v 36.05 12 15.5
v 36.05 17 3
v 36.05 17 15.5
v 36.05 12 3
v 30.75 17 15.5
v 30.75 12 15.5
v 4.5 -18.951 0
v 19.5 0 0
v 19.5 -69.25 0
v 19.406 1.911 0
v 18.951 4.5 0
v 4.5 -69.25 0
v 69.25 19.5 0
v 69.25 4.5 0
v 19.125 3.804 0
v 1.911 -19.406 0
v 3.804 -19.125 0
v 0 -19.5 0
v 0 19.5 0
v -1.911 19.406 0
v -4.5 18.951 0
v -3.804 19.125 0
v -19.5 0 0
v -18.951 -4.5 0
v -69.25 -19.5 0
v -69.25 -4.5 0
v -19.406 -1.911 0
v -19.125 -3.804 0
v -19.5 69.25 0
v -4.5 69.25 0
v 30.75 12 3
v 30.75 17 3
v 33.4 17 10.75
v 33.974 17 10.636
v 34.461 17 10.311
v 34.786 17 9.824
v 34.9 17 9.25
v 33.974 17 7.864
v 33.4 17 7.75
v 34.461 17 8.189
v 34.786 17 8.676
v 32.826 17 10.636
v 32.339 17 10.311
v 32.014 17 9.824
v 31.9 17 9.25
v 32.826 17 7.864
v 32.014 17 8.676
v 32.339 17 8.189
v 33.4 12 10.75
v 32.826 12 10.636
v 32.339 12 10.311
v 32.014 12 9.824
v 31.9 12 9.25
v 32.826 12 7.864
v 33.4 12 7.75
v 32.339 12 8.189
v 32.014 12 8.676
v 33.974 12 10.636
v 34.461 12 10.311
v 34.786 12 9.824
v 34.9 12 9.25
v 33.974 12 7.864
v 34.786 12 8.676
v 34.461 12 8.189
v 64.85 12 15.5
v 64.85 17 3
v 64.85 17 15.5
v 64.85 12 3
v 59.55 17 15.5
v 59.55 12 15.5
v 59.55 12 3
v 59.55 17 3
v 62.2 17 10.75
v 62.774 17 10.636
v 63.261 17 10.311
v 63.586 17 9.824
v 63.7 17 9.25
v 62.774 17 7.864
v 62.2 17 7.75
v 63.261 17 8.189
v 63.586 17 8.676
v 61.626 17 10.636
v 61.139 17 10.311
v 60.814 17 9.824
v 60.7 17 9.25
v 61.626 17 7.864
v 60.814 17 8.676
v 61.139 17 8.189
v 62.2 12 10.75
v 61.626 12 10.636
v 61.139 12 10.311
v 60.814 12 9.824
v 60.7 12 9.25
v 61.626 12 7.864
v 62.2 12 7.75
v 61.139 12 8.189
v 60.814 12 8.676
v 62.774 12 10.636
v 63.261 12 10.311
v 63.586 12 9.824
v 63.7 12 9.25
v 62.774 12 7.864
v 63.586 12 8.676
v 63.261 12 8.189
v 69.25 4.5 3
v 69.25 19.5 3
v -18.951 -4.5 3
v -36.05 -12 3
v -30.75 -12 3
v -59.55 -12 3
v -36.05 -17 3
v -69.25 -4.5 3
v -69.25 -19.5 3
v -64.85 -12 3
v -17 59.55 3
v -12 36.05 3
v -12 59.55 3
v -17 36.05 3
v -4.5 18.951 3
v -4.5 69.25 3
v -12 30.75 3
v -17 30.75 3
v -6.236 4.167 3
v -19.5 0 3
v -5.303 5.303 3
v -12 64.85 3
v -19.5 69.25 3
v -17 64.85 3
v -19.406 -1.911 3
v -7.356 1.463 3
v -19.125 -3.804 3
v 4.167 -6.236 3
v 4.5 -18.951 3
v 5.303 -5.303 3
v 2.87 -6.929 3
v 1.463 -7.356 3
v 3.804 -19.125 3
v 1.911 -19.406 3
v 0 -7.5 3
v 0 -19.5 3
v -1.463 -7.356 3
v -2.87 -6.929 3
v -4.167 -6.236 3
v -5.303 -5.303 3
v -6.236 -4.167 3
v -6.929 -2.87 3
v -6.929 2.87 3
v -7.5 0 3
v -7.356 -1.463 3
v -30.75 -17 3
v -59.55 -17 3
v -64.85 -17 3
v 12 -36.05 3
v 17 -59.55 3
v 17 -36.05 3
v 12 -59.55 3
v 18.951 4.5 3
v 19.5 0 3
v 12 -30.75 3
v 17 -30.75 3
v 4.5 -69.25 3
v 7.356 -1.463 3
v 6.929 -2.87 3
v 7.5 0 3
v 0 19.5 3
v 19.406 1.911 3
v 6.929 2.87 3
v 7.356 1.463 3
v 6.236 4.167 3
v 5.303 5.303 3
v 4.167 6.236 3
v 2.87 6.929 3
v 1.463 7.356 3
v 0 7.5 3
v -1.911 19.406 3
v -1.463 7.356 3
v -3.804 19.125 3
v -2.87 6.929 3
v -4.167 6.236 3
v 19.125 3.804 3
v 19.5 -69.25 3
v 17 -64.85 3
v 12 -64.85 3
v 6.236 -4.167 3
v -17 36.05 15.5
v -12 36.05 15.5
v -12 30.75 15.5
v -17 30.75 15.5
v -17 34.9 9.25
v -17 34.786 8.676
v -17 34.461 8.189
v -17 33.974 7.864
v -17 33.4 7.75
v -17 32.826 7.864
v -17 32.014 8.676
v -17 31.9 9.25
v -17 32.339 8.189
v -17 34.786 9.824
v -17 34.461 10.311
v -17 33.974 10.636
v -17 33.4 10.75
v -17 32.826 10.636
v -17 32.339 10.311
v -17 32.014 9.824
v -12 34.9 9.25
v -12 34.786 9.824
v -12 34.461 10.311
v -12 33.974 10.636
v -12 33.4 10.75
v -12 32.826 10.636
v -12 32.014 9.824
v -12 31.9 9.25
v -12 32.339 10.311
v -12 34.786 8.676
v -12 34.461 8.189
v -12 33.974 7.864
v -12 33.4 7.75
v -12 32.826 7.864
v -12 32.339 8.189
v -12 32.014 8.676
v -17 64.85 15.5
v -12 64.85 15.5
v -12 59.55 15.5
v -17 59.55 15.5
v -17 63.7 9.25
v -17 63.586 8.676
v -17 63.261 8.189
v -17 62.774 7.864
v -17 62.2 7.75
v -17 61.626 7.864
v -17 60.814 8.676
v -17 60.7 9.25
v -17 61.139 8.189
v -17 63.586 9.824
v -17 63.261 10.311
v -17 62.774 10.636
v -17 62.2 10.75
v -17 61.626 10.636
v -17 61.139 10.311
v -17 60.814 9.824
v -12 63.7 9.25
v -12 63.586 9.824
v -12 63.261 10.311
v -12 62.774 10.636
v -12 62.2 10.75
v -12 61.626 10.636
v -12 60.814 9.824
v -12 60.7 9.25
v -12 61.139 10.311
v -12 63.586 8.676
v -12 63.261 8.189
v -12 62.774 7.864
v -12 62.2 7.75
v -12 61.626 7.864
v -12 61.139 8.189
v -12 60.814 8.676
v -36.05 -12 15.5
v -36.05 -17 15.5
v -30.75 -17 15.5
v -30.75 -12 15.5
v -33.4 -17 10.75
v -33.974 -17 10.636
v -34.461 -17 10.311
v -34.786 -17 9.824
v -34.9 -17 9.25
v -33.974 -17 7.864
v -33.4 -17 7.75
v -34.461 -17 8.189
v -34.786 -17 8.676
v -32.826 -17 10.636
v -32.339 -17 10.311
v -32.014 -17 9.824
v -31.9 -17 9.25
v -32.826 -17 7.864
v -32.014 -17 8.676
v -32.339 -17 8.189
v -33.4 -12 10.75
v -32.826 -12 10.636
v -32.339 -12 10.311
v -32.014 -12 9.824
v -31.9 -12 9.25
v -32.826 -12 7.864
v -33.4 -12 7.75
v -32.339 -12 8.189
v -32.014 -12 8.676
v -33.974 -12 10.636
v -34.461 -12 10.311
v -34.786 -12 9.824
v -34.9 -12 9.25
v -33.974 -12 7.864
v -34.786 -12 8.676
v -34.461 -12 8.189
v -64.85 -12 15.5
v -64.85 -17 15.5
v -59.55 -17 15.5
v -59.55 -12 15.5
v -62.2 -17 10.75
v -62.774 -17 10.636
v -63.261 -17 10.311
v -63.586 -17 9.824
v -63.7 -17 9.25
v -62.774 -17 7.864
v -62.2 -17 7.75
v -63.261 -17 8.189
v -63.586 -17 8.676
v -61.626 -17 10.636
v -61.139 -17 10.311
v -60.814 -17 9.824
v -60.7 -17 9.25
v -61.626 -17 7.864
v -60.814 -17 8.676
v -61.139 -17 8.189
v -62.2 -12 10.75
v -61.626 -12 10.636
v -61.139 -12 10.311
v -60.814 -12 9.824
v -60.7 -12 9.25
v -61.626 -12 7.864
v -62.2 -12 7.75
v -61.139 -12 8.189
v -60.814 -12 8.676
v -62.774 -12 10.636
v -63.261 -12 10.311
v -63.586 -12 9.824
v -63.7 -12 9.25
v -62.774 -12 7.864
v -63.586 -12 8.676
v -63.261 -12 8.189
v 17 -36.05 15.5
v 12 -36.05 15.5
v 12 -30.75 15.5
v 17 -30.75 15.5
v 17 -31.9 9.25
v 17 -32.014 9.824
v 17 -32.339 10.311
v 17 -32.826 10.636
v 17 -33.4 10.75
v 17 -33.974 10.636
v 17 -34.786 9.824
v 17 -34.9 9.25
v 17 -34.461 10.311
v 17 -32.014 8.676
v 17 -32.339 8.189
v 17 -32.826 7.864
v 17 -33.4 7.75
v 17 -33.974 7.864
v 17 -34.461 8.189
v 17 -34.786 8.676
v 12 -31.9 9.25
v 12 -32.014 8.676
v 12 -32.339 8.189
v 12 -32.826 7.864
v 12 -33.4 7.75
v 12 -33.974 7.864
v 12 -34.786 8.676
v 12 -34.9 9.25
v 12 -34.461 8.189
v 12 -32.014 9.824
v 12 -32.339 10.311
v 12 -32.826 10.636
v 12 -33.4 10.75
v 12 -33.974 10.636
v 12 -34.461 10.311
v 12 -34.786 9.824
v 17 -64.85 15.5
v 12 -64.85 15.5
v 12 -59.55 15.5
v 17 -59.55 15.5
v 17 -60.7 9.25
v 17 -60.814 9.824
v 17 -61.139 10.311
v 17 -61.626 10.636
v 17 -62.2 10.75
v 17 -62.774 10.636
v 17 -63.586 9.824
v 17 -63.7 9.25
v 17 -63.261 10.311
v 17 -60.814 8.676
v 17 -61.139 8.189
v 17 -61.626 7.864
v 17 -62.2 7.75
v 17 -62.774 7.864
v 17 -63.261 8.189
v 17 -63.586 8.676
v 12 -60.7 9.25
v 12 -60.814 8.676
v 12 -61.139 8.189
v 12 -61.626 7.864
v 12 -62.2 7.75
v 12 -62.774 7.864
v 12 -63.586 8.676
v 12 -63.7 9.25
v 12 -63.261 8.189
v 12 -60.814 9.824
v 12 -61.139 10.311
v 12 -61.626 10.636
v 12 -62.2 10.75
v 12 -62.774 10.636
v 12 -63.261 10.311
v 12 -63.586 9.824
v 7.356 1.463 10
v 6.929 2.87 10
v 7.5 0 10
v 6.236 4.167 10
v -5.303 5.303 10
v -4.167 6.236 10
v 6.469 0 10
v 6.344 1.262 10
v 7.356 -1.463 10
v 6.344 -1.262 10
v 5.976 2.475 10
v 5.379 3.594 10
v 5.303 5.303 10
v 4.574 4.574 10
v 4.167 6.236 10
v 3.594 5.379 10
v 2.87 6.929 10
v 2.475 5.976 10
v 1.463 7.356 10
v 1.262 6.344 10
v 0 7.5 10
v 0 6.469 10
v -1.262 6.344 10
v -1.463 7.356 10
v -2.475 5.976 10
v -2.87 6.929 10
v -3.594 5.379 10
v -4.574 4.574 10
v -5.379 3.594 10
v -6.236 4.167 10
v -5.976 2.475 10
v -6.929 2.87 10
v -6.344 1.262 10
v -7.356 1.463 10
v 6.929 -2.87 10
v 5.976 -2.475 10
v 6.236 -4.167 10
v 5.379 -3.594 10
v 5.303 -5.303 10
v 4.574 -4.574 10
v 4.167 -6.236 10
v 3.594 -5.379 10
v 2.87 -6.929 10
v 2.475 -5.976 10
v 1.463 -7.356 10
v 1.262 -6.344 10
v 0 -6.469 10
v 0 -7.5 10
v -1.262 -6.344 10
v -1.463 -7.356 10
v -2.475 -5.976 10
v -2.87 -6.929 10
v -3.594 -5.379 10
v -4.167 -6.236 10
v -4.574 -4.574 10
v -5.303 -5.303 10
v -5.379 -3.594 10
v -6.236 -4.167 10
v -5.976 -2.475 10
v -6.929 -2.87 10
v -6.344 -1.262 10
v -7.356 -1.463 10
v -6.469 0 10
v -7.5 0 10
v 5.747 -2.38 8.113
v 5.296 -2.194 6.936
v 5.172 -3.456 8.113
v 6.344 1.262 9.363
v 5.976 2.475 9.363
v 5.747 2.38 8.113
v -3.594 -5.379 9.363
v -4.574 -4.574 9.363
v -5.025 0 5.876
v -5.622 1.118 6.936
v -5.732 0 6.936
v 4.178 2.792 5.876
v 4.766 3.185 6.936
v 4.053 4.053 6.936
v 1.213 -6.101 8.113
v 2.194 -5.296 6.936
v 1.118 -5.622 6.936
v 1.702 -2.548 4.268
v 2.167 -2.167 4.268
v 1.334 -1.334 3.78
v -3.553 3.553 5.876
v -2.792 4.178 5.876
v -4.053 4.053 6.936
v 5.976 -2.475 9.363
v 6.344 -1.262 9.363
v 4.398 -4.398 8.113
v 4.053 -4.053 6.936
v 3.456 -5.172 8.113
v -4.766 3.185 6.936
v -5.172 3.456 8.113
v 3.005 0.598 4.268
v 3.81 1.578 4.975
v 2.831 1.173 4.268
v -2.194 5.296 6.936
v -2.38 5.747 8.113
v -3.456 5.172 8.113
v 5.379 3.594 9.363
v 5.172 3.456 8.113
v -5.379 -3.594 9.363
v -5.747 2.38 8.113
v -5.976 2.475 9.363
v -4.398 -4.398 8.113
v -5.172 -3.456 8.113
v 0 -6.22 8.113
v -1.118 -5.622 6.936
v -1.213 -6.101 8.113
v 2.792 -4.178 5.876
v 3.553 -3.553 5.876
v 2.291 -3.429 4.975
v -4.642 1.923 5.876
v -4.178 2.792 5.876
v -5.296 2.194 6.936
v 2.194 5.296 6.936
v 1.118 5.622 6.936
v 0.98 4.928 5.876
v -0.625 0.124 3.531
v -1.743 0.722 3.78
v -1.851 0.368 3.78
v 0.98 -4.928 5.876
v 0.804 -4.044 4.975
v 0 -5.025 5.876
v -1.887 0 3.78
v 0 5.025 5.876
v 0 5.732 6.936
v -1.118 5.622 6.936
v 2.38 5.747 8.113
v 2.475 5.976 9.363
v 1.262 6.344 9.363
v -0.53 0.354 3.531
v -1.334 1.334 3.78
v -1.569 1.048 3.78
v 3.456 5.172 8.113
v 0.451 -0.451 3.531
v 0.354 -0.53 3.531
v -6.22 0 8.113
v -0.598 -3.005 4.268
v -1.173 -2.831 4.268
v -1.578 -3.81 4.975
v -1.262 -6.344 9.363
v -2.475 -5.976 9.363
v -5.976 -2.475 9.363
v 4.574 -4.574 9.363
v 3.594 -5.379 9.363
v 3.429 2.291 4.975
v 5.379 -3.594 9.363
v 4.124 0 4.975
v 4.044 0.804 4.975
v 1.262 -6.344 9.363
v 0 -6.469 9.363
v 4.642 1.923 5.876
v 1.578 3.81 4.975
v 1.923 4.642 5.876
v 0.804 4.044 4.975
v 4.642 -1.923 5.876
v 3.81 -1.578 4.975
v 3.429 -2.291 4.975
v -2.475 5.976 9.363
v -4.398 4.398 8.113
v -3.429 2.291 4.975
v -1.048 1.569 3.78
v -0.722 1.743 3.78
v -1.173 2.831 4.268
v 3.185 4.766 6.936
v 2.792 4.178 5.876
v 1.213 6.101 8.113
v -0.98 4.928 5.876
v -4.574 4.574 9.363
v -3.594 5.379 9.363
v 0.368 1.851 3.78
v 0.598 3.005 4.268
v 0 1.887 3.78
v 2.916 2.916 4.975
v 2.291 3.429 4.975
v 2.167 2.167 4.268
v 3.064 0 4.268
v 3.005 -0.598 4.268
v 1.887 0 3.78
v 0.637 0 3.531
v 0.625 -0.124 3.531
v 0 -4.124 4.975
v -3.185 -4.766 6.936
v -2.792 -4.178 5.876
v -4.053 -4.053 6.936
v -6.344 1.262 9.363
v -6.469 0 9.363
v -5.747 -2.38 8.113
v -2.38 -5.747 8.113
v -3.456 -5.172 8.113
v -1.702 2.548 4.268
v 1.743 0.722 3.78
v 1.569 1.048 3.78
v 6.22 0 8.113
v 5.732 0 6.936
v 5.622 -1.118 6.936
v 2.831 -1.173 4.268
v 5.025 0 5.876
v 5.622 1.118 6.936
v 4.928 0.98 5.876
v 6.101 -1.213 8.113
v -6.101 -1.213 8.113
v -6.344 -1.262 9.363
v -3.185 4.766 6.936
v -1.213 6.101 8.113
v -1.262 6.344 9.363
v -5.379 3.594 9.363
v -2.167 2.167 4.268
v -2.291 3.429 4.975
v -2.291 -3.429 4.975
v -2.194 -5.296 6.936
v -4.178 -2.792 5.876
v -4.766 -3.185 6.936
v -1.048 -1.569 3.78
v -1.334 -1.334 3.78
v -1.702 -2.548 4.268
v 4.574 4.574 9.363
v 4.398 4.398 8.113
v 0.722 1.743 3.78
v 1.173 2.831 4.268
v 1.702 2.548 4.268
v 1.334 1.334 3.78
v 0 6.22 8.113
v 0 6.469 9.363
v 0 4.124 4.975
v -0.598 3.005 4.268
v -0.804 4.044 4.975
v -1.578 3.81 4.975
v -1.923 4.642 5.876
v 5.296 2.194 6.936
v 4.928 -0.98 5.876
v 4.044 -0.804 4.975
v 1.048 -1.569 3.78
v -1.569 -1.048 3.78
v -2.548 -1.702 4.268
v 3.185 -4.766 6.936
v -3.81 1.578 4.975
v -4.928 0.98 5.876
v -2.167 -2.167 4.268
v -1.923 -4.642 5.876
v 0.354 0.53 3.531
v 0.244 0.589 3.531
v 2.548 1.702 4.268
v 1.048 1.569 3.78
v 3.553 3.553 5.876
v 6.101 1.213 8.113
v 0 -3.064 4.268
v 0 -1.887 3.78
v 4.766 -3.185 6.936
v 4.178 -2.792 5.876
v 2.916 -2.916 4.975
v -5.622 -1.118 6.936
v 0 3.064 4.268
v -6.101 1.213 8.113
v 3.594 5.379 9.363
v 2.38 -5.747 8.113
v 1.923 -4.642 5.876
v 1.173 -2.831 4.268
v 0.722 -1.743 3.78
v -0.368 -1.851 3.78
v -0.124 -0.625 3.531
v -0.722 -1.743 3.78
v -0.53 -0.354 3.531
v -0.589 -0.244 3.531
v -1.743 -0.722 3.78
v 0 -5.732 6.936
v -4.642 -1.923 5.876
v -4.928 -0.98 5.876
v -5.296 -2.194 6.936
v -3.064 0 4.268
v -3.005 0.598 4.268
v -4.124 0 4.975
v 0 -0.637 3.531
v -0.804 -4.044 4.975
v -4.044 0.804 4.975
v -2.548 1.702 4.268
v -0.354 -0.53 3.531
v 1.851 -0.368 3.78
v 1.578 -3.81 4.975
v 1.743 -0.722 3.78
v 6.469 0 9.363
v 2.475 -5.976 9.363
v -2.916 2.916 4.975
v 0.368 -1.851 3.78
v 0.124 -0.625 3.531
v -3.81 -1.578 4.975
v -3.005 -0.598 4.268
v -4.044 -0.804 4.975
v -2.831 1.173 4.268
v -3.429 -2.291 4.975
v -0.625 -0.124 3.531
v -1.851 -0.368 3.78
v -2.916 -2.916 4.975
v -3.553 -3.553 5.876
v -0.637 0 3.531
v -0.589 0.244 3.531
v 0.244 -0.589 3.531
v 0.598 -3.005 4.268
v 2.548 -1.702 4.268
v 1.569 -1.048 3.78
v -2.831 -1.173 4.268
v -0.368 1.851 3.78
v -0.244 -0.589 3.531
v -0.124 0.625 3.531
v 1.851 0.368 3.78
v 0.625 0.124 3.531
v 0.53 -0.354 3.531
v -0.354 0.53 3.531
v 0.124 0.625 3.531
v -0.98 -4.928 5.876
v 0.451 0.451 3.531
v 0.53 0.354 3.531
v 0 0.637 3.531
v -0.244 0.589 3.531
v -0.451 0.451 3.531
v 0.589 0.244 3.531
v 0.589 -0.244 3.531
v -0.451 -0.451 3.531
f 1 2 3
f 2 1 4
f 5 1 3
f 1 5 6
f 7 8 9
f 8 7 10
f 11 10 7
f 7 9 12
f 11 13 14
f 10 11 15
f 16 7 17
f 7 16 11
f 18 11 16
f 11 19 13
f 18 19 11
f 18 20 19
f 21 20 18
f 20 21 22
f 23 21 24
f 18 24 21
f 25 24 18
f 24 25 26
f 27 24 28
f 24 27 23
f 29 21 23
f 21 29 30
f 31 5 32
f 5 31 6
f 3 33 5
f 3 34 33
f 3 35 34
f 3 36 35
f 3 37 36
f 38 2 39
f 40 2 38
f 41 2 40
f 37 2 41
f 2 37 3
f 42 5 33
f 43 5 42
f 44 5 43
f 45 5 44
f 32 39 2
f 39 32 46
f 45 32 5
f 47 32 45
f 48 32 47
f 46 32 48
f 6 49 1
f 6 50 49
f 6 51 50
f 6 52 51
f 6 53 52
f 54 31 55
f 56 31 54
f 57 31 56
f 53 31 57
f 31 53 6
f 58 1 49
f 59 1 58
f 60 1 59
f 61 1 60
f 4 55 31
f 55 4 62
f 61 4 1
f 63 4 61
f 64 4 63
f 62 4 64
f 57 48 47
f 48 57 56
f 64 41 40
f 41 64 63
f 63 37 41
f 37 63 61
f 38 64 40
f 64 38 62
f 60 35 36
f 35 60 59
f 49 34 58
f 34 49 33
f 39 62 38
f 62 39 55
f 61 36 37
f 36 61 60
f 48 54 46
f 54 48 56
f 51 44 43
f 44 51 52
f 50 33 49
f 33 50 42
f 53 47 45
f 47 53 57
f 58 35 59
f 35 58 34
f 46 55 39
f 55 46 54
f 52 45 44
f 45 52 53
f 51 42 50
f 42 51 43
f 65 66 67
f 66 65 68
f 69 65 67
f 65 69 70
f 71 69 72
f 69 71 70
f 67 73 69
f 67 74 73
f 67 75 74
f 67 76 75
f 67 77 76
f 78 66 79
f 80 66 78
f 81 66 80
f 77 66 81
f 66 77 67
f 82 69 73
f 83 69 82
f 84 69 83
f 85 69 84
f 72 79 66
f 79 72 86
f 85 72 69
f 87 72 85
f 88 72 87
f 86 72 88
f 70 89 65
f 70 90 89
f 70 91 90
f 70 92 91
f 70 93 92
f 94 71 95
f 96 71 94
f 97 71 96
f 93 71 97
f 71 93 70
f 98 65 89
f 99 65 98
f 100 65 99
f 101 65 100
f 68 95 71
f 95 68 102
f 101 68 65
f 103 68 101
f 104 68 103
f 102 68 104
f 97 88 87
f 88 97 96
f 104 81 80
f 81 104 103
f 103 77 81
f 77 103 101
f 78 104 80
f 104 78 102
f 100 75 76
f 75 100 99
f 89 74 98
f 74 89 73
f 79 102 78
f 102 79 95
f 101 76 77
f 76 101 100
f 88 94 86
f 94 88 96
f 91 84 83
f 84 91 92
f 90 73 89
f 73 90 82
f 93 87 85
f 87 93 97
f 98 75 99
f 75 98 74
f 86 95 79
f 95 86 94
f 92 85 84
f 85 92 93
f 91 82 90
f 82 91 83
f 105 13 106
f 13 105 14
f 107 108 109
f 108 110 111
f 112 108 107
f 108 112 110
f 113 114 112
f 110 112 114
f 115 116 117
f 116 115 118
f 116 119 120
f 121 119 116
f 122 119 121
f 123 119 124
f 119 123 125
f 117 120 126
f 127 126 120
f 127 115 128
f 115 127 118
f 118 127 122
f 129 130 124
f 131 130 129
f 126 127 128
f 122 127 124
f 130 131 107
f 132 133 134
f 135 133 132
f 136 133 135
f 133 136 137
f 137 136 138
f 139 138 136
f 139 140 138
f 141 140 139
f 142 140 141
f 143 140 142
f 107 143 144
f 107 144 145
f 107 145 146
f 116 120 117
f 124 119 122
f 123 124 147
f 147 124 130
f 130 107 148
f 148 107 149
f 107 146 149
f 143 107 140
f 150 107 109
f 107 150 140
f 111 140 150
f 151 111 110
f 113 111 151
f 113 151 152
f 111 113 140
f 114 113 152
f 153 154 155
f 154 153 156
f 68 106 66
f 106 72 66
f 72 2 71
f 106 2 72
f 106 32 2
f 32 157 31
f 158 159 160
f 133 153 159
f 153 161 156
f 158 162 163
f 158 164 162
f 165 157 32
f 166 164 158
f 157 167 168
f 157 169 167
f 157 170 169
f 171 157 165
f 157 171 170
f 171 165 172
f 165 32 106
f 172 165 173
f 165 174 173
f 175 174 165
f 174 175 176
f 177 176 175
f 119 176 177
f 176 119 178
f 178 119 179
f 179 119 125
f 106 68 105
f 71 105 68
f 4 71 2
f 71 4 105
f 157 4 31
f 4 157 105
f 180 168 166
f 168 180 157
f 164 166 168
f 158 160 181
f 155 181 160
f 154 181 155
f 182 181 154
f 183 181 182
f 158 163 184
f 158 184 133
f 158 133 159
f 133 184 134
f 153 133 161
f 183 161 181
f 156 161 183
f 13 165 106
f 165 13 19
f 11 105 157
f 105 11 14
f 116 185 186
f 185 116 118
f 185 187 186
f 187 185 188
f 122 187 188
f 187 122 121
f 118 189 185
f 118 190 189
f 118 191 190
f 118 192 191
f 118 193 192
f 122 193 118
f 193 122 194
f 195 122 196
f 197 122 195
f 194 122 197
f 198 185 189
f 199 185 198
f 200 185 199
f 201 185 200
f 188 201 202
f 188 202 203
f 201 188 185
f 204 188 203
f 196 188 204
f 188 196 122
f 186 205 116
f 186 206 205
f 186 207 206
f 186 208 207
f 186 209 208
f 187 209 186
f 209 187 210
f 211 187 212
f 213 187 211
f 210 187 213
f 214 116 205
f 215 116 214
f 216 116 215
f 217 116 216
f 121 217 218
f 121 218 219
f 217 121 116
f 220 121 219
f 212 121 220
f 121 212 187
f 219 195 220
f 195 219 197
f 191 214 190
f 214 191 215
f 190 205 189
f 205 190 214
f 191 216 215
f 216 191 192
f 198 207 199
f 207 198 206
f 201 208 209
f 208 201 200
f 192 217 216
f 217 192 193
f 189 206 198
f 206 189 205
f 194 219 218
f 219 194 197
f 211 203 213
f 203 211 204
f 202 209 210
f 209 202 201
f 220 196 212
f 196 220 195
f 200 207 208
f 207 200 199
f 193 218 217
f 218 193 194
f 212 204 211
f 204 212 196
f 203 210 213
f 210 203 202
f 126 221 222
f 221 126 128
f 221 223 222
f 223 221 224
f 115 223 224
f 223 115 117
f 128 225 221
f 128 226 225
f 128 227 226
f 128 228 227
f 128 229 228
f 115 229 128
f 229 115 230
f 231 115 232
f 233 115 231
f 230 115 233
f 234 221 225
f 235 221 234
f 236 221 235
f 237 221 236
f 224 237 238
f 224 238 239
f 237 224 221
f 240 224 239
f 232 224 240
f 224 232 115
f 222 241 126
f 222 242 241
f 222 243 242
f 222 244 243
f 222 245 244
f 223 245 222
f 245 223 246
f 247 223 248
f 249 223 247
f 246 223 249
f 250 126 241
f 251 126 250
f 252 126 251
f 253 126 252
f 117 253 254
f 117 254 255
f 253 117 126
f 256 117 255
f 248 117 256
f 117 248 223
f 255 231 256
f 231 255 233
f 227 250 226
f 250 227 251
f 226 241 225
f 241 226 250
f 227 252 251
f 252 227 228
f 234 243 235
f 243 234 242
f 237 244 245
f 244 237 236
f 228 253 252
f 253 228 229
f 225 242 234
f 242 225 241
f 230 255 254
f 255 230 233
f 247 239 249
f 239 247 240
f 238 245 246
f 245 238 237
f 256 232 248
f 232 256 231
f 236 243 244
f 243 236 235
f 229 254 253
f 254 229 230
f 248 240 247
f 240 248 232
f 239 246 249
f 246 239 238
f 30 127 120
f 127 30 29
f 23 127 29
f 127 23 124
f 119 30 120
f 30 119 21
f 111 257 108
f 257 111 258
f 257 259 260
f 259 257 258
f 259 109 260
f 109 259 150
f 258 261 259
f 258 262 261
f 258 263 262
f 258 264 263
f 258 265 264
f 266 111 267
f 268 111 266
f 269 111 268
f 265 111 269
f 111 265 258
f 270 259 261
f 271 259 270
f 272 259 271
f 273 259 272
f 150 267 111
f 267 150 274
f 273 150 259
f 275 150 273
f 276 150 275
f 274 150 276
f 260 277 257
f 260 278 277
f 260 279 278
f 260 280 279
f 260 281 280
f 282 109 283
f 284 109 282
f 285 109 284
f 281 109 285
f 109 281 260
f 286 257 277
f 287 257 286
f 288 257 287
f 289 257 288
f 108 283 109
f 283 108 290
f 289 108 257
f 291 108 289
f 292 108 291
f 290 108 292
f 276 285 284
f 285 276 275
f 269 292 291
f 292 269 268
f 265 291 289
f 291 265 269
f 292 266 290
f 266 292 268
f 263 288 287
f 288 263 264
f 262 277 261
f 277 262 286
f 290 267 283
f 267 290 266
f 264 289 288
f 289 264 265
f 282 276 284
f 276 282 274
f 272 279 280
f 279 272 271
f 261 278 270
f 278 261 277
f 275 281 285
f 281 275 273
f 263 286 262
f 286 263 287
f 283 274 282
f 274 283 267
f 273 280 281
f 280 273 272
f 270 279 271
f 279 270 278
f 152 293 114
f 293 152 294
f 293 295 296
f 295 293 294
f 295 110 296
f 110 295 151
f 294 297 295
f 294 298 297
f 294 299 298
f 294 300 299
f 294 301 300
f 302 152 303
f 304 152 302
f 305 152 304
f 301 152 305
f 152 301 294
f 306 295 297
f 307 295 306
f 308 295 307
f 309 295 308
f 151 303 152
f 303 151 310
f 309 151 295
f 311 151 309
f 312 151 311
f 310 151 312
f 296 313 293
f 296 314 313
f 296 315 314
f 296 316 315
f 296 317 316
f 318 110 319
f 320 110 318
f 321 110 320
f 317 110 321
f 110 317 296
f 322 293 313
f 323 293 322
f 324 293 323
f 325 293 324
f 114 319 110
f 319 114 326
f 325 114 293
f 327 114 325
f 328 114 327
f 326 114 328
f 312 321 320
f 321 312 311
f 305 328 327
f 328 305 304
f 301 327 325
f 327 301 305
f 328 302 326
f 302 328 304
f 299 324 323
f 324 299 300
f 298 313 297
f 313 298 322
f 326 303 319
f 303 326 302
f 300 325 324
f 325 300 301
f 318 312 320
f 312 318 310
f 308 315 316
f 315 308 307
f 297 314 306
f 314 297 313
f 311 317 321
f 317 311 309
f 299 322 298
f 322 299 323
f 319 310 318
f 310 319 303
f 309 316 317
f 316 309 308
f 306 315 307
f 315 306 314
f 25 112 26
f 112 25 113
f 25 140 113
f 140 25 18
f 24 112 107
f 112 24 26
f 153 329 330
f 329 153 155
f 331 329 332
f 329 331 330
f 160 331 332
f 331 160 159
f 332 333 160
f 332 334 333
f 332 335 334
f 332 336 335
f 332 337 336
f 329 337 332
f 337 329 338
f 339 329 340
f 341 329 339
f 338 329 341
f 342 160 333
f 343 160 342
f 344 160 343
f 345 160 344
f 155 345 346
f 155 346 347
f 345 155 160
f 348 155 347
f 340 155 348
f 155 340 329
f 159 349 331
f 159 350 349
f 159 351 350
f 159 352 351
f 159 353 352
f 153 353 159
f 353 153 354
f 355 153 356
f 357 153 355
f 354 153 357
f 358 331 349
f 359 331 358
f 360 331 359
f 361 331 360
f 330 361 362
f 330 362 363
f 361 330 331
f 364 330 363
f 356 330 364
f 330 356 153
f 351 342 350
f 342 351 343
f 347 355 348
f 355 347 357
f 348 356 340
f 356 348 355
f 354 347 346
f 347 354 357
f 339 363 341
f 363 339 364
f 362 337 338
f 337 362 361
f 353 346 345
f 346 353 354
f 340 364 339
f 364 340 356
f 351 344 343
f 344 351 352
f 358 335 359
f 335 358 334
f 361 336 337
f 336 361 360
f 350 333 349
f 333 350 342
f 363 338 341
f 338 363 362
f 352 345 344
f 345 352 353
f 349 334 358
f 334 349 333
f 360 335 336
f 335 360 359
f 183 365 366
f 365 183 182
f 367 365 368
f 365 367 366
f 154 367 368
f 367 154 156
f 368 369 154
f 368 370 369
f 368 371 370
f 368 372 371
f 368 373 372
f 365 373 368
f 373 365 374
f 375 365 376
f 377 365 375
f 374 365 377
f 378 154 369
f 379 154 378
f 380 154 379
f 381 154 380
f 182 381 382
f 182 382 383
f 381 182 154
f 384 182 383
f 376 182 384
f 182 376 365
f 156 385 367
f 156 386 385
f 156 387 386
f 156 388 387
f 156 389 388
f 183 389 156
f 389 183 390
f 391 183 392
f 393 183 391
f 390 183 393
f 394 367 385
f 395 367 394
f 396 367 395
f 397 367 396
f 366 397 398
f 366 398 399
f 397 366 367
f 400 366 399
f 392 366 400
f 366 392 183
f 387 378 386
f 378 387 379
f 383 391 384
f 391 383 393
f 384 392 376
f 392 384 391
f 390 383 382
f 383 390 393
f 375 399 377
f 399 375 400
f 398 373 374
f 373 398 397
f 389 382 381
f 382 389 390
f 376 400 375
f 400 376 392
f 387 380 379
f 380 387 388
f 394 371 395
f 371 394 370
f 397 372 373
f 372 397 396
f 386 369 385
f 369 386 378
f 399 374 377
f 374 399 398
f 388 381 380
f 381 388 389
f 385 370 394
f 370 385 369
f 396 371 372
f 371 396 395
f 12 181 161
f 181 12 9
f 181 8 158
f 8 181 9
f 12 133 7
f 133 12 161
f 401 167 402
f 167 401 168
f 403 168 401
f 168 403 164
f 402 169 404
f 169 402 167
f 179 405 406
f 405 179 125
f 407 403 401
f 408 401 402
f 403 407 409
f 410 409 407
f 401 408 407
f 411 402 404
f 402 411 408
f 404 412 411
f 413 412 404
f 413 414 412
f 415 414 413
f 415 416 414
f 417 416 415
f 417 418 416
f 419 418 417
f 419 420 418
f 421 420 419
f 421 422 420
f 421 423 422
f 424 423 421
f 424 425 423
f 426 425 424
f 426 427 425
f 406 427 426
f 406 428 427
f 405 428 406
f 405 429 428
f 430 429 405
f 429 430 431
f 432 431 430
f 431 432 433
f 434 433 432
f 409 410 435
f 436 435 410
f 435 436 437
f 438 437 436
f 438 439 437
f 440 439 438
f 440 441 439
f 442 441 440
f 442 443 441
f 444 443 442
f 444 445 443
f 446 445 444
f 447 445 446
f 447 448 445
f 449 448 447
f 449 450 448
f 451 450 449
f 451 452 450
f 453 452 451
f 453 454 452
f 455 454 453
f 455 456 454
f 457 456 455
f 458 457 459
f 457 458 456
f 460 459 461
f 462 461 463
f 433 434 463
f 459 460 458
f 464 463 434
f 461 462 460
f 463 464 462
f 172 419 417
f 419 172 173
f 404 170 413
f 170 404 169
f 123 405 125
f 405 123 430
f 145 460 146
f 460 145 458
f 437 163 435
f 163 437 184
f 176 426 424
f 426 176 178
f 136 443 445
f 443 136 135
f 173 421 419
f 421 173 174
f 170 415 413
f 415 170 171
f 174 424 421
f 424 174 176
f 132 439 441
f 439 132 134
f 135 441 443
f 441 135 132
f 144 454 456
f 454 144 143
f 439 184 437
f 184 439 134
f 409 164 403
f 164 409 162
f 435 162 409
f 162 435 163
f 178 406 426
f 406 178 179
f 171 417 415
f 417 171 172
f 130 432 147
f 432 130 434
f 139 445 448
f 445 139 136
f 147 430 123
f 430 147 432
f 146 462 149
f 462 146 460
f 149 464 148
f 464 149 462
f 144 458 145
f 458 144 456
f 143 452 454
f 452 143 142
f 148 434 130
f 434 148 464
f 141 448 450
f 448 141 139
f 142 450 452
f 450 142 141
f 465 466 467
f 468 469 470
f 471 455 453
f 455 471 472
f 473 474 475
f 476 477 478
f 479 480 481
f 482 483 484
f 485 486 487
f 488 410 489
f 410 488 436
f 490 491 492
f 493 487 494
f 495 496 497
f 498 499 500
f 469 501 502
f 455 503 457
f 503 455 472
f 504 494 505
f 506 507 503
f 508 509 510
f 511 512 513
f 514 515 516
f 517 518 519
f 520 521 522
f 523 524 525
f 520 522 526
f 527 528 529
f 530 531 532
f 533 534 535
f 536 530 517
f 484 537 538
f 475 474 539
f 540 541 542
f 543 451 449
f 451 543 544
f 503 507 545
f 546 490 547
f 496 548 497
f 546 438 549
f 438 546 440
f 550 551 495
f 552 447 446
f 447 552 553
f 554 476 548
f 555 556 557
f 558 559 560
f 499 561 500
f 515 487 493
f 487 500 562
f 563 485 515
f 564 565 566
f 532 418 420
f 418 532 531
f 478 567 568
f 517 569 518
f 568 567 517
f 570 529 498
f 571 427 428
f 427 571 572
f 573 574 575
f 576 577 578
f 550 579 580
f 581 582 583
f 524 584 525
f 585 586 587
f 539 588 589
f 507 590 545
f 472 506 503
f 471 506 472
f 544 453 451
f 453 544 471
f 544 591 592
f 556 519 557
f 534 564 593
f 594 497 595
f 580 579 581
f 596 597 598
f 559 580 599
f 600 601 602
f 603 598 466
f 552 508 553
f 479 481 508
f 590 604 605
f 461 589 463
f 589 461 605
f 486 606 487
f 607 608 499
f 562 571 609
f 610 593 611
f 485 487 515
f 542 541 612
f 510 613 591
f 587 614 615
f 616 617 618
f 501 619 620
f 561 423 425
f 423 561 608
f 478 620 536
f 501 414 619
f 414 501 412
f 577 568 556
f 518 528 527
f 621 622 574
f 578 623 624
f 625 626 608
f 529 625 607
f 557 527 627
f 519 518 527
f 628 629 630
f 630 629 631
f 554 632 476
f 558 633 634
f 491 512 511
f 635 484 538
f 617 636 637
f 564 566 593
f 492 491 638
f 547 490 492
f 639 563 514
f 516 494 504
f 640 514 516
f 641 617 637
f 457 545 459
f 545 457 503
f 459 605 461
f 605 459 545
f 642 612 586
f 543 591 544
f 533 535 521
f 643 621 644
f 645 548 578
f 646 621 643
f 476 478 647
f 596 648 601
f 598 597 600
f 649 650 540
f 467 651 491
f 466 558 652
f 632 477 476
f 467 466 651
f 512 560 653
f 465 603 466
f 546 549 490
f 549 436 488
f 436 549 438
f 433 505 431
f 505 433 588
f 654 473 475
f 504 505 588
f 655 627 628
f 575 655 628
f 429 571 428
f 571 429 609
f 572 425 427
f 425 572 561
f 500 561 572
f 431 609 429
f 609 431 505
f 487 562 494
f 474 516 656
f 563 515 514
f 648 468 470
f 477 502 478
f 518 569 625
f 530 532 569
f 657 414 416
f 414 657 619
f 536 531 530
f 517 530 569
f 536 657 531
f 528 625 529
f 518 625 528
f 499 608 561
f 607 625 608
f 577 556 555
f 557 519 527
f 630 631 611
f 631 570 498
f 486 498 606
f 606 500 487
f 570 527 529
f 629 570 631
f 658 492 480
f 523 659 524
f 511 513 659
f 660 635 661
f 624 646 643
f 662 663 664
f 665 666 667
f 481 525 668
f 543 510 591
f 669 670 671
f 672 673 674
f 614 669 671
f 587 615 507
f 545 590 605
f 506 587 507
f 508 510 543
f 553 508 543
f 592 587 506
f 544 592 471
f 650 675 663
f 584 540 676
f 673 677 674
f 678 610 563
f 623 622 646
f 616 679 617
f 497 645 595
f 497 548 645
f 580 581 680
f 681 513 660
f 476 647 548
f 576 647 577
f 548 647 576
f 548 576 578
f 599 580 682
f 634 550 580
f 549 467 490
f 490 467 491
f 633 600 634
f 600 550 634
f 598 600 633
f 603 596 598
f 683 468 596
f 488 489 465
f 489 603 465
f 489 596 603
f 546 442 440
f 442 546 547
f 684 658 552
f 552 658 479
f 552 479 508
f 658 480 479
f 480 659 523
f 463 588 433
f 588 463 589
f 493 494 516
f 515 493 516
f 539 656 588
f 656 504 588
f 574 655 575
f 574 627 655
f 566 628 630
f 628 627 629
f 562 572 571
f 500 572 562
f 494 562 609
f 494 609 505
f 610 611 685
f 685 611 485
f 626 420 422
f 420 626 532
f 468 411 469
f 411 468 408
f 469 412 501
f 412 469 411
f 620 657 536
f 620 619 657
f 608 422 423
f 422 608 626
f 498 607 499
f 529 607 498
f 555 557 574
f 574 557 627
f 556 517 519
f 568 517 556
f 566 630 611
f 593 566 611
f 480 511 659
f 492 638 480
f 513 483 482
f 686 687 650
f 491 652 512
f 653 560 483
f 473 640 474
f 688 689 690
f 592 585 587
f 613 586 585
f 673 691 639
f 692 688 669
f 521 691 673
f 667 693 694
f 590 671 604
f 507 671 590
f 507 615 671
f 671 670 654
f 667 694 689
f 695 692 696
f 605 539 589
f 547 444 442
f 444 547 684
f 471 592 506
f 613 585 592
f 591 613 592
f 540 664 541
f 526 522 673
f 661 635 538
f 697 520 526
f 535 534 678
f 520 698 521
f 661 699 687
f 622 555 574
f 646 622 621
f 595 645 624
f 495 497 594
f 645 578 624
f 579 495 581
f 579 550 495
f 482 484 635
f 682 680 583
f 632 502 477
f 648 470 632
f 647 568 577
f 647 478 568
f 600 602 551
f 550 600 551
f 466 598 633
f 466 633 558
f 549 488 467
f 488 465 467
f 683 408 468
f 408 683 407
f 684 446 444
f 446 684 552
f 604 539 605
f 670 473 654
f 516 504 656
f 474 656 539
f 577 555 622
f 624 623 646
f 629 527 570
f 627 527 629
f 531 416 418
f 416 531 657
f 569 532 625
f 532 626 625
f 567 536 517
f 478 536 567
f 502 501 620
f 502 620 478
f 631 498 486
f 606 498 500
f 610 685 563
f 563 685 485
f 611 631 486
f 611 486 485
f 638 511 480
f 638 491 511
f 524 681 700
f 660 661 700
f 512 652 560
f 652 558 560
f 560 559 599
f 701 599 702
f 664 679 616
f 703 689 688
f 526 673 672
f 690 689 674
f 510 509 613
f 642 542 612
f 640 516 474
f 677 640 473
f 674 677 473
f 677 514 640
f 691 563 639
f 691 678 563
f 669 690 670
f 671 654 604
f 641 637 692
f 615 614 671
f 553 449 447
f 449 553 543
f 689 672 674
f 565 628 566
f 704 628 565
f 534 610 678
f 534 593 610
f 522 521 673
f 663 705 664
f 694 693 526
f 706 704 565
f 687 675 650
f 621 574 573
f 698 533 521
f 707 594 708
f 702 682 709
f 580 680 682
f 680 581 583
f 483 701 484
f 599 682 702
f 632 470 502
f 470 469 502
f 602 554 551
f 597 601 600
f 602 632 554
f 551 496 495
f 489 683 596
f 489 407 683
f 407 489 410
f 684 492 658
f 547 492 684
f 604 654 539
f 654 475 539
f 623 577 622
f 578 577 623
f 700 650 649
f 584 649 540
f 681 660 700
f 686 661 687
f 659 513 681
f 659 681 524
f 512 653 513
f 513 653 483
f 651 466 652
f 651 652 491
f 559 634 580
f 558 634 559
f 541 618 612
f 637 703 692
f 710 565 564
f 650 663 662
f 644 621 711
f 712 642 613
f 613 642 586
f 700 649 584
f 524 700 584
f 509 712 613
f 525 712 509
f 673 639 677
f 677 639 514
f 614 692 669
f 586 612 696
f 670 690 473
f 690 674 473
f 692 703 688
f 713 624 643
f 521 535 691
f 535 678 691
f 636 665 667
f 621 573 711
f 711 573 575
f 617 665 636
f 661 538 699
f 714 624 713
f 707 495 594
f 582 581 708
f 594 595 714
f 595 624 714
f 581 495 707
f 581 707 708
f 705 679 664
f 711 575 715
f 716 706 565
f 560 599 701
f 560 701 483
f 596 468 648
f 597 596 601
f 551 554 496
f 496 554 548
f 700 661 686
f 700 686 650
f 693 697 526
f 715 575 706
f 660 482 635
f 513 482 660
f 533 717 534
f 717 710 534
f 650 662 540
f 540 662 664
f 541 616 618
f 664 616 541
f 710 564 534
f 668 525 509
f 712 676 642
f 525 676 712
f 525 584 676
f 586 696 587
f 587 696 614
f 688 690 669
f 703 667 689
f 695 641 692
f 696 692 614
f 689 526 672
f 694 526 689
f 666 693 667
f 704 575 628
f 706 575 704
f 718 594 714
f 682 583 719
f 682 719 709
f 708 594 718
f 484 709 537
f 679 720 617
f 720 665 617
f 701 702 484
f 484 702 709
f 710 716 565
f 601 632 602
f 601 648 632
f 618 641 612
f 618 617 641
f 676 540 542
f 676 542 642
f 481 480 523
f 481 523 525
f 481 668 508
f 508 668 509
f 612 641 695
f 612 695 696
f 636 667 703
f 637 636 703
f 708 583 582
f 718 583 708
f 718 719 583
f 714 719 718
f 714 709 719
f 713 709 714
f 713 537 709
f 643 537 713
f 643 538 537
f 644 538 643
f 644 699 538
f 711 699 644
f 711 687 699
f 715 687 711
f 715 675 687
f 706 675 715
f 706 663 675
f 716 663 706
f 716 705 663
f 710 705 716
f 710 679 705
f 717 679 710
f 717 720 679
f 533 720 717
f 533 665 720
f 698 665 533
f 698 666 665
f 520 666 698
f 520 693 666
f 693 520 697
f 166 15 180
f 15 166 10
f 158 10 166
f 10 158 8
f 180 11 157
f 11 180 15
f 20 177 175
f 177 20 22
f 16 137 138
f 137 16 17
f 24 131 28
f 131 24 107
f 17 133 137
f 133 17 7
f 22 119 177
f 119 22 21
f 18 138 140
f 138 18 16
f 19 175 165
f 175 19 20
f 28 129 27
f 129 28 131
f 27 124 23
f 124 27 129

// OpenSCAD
union() {
	union() {
		rotate(a = 0.0000000000, v = [0, 0, 1]) {
			union() {
				translate(v = [0, 4.5000000000, 0]) {
					cube(size = [69.2500000000, 15, 3]);
				}
				translate(v = [30.7500000000, 12, 0]) {
					union() {
						difference() {
							cube(size = [5.3000000000, 5, 15.5000000000]);
							translate(v = [2.6500000000, 0, 9.2500000000]) {
								rotate(a = -90, v = [1, 0, 0]) {
									translate(v = [0, 0, -0.5000000000]) {
										cylinder($fn = 16, h = 6, r = 1.5000000000);
									}
								}
							}
						}
						translate(v = [28.8000000000, 0, 0]) {
							difference() {
								cube(size = [5.3000000000, 5, 15.5000000000]);
								translate(v = [2.6500000000, 0, 9.2500000000]) {
									rotate(a = -90, v = [1, 0, 0]) {
										translate(v = [0, 0, -0.5000000000]) {
											cylinder($fn = 16, h = 6, r = 1.5000000000);
										}
									}
								}
							}
						}
					}
				}
			}
		}
		rotate(a = 90.0000000000, v = [0, 0, 1]) {
			union() {
				translate(v = [0, 4.5000000000, 0]) {
					cube(size = [69.2500000000, 15, 3]);
				}
				translate(v = [30.7500000000, 12, 0]) {
					union() {
						difference() {
							cube(size = [5.3000000000, 5, 15.5000000000]);
							translate(v = [2.6500000000, 0, 9.2500000000]) {
								rotate(a = -90, v = [1, 0, 0]) {
									translate(v = [0, 0, -0.5000000000]) {
										cylinder($fn = 16, h = 6, r = 1.5000000000);
									}
								}
							}
						}
						translate(v = [28.8000000000, 0, 0]) {
							difference() {
								cube(size = [5.3000000000, 5, 15.5000000000]);
								translate(v = [2.6500000000, 0, 9.2500000000]) {
									rotate(a = -90, v = [1, 0, 0]) {
										translate(v = [0, 0, -0.5000000000]) {
											cylinder($fn = 16, h = 6, r = 1.5000000000);
										}
									}
								}
							}
						}
					}
				}
			}
		}
		rotate(a = 180.0000000000, v = [0, 0, 1]) {
			union() {
				translate(v = [0, 4.5000000000, 0]) {
					cube(size = [69.2500000000, 15, 3]);
				}
				translate(v = [30.7500000000, 12, 0]) {
					union() {
						difference() {
							cube(size = [5.3000000000, 5, 15.5000000000]);
							translate(v = [2.6500000000, 0, 9.2500000000]) {
								rotate(a = -90, v = [1, 0, 0]) {
									translate(v = [0, 0, -0.5000000000]) {
										cylinder($fn = 16, h = 6, r = 1.5000000000);
									}
								}
							}
						}
						translate(v = [28.8000000000, 0, 0]) {
							difference() {
								cube(size = [5.3000000000, 5, 15.5000000000]);
								translate(v = [2.6500000000, 0, 9.2500000000]) {
									rotate(a = -90, v = [1, 0, 0]) {
										translate(v = [0, 0, -0.5000000000]) {
											cylinder($fn = 16, h = 6, r = 1.5000000000);
										}
									}
								}
							}
						}
					}
				}
			}
		}
		rotate(a = 270.0000000000, v = [0, 0, 1]) {
			union() {
				translate(v = [0, 4.5000000000, 0]) {
					cube(size = [69.2500000000, 15, 3]);
				}
				translate(v = [30.7500000000, 12, 0]) {
					union() {
						difference() {
							cube(size = [5.3000000000, 5, 15.5000000000]);
							translate(v = [2.6500000000, 0, 9.2500000000]) {
								rotate(a = -90, v = [1, 0, 0]) {
									translate(v = [0, 0, -0.5000000000]) {
										cylinder($fn = 16, h = 6, r = 1.5000000000);
									}
								}
							}
						}
						translate(v = [28.8000000000, 0, 0]) {
							difference() {
								cube(size = [5.3000000000, 5, 15.5000000000]);
								translate(v = [2.6500000000, 0, 9.2500000000]) {
									rotate(a = -90, v = [1, 0, 0]) {
										translate(v = [0, 0, -0.5000000000]) {
											cylinder($fn = 16, h = 6, r = 1.5000000000);
										}
									}
								}
							}
						}
					}
				}
			}
		}
		union() {
			difference() {
				cylinder($fn = 32, h = 10, r = 7.5000000000);
				translate(v = [0, 0, 10]) {
					sphere($fn = 32, r = 6.5000000000);
				}
			}
			cylinder($fn = 64, h = 3, r = 19.5000000000);
		}
	}
}
